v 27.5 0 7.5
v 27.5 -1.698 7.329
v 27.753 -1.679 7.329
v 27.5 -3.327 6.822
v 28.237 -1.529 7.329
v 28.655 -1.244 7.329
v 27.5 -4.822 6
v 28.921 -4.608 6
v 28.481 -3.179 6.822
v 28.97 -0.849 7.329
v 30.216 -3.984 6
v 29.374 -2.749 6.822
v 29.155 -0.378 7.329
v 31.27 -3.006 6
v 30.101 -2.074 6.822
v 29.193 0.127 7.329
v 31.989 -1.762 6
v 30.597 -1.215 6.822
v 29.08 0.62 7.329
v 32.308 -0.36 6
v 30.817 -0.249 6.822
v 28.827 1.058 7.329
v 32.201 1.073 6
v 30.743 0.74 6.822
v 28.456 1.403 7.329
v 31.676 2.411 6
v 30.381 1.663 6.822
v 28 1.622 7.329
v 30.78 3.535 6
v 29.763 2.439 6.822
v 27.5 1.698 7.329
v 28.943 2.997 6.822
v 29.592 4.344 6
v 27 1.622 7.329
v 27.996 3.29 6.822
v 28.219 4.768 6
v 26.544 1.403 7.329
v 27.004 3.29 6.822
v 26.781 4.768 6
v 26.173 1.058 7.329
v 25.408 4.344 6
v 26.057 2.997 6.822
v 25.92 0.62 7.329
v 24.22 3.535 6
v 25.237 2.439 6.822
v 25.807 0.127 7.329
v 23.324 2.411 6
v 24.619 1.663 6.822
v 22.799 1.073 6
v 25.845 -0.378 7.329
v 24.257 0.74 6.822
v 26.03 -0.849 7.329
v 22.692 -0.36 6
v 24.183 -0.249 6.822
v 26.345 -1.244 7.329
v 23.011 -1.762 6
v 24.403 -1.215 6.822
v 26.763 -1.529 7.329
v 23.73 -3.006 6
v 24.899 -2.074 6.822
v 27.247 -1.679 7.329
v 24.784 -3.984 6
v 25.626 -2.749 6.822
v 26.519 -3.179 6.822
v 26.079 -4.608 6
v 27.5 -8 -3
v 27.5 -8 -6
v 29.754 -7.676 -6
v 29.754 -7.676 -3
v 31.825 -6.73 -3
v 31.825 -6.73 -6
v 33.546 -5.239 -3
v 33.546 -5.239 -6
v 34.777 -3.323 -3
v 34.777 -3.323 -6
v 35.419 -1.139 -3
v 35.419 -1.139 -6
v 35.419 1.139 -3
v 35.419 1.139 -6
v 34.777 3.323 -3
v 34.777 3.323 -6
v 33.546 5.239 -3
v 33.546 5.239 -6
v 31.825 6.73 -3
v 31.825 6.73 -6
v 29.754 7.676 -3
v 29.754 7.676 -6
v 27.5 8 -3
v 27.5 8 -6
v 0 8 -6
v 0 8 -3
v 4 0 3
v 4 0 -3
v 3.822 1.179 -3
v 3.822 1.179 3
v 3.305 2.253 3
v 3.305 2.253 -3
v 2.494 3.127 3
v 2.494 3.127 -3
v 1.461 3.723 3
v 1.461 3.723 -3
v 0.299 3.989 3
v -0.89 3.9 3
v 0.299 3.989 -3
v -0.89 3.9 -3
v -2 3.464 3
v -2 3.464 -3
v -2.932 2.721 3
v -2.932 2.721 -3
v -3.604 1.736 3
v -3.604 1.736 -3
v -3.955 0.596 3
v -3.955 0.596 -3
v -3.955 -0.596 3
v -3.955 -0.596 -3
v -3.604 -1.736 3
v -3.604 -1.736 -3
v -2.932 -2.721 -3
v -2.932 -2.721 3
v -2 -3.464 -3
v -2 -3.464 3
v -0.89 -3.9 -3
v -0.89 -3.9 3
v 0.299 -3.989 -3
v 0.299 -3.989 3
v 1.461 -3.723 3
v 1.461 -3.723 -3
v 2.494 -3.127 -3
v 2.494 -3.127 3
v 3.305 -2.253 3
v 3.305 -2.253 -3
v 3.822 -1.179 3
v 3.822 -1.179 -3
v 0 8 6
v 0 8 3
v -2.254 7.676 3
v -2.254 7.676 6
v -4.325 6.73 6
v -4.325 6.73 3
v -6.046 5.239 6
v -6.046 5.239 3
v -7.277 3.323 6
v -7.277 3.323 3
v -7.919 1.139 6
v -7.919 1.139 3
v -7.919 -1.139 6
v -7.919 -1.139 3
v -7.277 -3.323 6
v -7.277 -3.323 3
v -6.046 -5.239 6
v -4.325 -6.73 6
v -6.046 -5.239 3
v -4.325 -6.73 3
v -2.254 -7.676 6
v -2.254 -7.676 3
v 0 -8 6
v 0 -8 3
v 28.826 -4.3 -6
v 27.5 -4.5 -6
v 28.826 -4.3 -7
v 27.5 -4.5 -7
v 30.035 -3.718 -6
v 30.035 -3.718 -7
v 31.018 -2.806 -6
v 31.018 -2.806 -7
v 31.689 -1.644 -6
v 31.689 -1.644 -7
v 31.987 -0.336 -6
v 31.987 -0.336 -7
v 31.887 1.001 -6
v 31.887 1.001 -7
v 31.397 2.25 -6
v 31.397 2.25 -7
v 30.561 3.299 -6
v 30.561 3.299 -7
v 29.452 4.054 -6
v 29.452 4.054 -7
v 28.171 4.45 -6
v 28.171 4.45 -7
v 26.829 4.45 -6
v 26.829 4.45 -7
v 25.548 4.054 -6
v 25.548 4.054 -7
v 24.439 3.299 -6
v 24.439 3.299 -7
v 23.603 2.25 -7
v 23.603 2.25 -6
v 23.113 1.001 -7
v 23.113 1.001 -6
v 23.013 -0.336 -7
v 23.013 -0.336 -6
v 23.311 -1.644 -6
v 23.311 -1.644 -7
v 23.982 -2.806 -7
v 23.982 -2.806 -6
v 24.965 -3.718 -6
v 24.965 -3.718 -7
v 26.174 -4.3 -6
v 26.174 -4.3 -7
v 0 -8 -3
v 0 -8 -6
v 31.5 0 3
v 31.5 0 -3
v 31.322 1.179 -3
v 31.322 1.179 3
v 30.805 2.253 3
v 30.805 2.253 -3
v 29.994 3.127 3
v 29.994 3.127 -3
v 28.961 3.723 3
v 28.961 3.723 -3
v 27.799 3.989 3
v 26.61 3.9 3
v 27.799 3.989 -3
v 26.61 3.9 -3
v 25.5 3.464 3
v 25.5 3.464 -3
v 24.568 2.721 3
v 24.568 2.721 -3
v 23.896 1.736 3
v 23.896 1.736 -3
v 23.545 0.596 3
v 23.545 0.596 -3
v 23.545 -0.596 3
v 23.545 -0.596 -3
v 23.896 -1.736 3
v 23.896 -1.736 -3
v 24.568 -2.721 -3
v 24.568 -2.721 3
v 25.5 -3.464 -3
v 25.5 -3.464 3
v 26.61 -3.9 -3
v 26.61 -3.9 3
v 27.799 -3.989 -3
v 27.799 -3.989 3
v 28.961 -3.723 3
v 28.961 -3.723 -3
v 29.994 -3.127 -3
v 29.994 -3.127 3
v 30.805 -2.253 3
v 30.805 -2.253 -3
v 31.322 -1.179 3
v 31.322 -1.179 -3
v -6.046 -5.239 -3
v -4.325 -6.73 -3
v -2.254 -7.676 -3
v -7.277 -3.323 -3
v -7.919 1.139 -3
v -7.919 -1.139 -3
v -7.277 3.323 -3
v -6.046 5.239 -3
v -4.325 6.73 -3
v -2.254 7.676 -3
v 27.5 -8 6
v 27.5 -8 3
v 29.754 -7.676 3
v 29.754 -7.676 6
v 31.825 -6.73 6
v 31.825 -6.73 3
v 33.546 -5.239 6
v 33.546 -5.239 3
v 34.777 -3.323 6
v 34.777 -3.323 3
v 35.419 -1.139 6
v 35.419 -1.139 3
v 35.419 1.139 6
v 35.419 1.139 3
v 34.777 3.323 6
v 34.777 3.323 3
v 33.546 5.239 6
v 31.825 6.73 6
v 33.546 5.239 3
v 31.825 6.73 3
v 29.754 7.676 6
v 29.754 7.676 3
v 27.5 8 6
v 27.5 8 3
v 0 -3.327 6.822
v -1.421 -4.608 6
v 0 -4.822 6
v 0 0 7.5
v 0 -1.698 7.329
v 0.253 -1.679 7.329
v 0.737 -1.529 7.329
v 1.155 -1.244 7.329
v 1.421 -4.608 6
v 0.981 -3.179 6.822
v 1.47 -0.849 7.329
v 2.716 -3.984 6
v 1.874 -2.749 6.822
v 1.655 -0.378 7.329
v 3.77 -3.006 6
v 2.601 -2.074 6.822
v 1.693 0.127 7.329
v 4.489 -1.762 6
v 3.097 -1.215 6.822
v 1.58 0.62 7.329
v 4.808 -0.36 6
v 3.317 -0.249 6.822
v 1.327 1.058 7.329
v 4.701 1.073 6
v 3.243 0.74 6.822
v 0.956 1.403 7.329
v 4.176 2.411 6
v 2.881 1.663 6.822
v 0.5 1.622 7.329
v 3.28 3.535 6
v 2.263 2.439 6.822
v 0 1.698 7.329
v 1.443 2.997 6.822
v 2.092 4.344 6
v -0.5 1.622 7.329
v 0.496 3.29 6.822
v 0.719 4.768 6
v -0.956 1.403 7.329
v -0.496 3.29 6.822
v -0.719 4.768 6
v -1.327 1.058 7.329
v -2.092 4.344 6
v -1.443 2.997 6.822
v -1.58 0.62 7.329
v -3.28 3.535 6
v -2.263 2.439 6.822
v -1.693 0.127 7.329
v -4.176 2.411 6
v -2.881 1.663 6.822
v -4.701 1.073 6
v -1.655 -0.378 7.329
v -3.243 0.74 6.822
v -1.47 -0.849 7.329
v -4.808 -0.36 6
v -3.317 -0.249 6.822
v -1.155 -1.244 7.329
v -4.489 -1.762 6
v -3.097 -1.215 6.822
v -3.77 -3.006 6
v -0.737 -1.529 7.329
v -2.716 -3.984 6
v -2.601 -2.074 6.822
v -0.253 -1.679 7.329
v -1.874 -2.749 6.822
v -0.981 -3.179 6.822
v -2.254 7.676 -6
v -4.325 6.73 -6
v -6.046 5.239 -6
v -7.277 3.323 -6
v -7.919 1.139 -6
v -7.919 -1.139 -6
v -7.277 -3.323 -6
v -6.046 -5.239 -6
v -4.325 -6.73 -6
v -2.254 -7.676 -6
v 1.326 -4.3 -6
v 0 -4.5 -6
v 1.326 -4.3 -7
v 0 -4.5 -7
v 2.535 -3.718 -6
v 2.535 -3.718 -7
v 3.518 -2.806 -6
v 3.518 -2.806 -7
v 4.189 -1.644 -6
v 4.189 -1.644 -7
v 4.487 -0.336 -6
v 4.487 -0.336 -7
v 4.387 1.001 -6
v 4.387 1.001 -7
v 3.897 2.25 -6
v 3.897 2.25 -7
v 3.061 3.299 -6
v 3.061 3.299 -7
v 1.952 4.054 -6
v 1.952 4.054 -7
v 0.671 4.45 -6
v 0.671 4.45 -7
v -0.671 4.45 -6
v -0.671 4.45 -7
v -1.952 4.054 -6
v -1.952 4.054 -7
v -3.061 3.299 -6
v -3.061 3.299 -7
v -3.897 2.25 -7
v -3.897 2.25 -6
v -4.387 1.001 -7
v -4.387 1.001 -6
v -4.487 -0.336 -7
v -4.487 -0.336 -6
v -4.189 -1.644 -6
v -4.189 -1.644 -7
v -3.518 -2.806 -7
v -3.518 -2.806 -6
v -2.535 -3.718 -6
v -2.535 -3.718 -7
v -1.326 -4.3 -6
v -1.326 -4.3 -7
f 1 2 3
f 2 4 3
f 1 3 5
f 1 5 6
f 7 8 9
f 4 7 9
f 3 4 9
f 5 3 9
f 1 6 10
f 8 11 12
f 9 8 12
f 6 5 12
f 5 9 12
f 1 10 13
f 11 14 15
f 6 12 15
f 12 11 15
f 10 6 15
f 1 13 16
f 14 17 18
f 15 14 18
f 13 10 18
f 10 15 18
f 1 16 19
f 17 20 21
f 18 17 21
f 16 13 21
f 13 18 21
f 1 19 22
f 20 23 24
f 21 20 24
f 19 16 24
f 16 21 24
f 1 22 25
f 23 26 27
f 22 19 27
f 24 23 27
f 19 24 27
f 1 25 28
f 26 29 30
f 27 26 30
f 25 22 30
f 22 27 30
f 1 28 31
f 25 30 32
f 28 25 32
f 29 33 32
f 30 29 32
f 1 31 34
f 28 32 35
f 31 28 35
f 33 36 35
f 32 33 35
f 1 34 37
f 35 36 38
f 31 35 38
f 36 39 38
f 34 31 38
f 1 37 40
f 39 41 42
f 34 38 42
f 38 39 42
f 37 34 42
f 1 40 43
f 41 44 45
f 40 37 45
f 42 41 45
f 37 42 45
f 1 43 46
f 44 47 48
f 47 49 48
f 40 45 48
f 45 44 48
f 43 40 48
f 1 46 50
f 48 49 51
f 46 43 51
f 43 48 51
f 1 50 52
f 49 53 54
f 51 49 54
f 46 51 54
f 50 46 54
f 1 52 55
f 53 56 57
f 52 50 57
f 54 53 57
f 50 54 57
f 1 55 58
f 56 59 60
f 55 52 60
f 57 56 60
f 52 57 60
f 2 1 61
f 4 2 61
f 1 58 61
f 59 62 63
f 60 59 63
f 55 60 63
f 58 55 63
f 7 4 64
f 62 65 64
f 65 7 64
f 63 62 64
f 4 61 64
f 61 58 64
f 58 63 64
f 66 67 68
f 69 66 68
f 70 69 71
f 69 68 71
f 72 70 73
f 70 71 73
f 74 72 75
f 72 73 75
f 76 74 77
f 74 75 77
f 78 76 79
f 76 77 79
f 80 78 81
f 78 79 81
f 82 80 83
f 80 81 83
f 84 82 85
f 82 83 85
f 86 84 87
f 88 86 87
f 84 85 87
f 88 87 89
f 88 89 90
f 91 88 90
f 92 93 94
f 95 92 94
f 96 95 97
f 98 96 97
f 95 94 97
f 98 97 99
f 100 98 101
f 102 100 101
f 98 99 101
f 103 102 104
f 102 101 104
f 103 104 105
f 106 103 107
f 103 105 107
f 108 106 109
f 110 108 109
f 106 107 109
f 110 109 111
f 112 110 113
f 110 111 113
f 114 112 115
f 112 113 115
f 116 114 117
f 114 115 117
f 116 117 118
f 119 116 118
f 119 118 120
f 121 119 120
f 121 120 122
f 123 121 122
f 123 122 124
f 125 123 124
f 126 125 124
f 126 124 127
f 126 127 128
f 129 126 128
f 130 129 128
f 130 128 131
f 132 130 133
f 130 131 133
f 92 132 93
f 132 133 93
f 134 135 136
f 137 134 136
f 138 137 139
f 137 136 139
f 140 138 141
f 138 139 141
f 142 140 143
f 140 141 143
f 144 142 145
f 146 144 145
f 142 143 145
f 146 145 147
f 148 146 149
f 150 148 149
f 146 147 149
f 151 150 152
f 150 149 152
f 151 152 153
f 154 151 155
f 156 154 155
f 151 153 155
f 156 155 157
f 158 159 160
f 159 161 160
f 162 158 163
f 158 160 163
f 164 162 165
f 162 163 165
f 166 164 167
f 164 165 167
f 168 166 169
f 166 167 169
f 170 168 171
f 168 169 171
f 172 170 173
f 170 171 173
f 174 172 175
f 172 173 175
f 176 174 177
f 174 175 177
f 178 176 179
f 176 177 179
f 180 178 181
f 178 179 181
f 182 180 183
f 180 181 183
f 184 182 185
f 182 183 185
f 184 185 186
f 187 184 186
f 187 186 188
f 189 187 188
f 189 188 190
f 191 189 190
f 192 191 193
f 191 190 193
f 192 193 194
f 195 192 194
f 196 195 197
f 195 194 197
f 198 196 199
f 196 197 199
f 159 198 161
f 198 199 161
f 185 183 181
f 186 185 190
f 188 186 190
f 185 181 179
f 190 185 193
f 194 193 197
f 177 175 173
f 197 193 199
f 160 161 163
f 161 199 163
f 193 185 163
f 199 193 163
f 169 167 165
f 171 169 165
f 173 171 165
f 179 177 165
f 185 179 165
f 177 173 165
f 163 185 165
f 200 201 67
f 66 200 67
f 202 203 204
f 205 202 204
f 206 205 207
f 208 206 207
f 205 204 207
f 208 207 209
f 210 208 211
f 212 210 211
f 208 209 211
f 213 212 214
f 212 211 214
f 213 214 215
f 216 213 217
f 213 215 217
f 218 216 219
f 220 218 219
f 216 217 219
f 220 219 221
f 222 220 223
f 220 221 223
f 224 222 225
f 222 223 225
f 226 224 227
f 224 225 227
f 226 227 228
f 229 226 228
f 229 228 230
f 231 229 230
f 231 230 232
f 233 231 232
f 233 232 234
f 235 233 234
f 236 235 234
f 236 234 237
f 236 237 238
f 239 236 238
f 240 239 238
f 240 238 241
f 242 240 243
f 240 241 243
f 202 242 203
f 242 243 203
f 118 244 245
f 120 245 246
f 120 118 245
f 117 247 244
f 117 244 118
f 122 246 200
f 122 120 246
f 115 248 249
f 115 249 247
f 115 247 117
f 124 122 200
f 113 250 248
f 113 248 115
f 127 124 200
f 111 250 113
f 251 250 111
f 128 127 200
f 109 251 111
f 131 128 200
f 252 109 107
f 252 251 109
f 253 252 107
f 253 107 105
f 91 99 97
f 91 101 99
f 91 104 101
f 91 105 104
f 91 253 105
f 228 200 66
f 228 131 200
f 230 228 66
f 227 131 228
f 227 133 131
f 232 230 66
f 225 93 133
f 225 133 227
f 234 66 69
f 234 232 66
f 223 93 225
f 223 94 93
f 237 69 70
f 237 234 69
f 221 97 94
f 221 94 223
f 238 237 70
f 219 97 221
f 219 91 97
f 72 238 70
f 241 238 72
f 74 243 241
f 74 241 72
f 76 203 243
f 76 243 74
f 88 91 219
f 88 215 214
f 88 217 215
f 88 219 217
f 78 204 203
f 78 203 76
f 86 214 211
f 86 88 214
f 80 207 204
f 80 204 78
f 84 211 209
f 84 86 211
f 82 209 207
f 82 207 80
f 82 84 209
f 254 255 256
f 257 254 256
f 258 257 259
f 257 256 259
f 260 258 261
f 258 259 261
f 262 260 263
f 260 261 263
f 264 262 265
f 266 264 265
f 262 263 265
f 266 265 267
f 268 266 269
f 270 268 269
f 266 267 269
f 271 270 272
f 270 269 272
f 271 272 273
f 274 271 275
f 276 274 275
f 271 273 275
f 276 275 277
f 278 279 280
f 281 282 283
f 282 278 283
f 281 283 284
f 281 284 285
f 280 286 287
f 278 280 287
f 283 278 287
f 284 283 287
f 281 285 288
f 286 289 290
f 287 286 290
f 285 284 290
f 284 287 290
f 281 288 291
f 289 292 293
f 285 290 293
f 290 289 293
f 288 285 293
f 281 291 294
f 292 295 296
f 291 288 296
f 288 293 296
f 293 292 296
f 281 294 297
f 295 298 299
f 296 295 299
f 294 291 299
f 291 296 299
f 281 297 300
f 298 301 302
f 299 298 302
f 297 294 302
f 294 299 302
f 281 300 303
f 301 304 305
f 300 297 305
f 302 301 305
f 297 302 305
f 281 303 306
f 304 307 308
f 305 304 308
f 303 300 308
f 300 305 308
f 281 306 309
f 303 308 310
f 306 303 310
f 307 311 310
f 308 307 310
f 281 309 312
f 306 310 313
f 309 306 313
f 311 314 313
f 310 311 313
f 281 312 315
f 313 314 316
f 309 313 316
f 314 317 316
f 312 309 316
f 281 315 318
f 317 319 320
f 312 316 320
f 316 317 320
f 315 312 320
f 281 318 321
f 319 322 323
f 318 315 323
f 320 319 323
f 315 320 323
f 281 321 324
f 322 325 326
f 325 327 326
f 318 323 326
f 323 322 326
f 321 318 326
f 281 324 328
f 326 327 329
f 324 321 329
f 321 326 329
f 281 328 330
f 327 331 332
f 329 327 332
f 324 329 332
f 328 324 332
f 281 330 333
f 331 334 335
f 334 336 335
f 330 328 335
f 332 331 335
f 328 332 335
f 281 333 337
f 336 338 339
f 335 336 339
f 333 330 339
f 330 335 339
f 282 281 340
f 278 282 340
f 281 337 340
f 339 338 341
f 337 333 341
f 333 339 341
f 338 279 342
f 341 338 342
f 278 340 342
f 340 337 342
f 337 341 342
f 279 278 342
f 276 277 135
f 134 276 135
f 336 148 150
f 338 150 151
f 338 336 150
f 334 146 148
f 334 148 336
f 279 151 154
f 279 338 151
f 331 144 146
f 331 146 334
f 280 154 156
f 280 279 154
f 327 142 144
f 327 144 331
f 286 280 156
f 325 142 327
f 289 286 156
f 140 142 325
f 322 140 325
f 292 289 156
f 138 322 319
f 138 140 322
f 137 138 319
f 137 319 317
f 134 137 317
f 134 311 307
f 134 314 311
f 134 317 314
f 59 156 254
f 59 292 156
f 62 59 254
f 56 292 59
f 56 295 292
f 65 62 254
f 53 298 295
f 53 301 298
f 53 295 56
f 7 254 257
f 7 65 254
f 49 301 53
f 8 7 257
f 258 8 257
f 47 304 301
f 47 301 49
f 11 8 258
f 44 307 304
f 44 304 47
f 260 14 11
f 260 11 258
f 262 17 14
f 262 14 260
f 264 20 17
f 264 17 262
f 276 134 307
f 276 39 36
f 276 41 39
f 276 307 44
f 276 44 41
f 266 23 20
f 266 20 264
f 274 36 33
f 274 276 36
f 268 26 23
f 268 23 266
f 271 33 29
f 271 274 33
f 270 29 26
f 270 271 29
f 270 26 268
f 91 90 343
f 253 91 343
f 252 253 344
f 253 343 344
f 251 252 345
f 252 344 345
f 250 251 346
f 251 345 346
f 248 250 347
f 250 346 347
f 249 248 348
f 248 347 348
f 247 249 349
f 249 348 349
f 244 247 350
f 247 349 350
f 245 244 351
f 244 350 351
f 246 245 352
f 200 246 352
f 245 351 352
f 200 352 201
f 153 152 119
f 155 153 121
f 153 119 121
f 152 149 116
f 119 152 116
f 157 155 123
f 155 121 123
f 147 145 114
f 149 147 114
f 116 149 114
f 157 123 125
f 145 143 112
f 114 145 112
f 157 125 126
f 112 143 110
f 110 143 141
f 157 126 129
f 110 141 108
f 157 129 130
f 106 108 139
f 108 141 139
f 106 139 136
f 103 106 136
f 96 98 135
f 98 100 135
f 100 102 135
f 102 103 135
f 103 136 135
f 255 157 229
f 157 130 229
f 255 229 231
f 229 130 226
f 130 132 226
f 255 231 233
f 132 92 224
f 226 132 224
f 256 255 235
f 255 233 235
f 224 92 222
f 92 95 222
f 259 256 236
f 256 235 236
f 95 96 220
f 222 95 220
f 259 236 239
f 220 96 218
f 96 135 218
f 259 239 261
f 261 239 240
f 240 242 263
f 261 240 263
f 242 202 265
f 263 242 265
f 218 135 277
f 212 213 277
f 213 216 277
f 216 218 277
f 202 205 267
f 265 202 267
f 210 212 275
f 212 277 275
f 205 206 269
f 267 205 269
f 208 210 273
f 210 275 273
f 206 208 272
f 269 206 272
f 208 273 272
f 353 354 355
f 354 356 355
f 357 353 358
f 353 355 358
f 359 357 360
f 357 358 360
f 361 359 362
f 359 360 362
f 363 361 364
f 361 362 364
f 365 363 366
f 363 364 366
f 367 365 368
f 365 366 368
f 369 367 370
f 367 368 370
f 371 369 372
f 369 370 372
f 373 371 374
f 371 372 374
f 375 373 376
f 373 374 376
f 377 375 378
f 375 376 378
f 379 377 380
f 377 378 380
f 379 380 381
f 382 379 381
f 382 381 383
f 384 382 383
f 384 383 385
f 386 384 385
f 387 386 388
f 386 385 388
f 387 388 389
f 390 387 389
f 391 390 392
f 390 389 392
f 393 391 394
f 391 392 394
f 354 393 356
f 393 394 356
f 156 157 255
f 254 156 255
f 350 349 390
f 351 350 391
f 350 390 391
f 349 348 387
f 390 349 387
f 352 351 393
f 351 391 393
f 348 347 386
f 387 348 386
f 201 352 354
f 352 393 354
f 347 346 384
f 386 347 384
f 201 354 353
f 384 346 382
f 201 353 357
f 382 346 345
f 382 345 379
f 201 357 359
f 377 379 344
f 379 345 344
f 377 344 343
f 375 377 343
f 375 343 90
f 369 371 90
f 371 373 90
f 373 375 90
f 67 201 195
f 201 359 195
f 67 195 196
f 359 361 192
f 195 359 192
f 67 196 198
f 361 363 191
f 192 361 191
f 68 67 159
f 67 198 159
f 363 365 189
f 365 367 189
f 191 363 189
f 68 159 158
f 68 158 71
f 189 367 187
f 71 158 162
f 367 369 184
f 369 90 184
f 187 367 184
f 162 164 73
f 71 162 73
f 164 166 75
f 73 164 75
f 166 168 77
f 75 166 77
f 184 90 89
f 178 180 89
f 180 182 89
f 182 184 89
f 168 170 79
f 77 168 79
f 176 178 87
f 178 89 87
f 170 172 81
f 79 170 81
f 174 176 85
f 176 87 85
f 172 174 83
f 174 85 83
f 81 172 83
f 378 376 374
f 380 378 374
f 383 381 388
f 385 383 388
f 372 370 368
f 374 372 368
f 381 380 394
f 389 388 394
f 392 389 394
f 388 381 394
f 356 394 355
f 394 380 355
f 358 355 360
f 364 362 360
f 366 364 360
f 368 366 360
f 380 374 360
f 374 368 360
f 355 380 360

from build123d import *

# Parameters (mm, degrees)
EXTRUDE_1_DEPTH          = 6
EXTRUDE_1_DEPTH_BACK     = 6
CUT_EXTRUDE_1_DEPTH      = 3
CUT_EXTRUDE_1_DEPTH_BACK = 3
SKETCH_4_R               = 4


with BuildPart() as part:
    # 草图1 → 凸台-拉伸1 (new, two sides: drawn at the far end of the back side and taken through both)
    with BuildSketch(Plane.XY.offset(-EXTRUDE_1_DEPTH_BACK)):
        with BuildLine():
            Line((0, -8), (27.5, -8))
            ThreePointArc((27.5, -8), (35.5, 0), (27.5, 8))
            Line((27.5, 8), (0, 8))
            ThreePointArc((0, 8), (-8, 0), (0, -8))
        make_face()
    extrude(amount=EXTRUDE_1_DEPTH + EXTRUDE_1_DEPTH_BACK)

    # 草图2 → 旋转1 (revolve)
    with BuildSketch(Plane(origin=(0, 0, 0), x_dir=(0, 0, -1), z_dir=(1, 0, 0))):
        with BuildLine():
            Line((-6, 4.82182538), (-6, 4))
            Line((-6, 4), (6, 4))
            Line((6, 4), (6, 4.5))
            Line((6, 4.5), (7, 4.5))
            Line((7, 4.5), (7, 0))
            Line((7, 0), (-7.5, 0))
            ThreePointArc((-7.5, 0), (-7.11634154, 2.524876235), (-6, 4.82182538))
        make_face()
    revolve(axis=Axis((0, 0, -7), (0, 0, 1)))

    # 草图3 → 旋转2 (revolve)
    with BuildSketch(Plane(origin=(27.5, 0, 0), x_dir=(0, 0, -1), z_dir=(1, 0, 0))):
        with BuildLine():
            Line((-6, 4.82182538), (-6, 4))
            Line((-6, 4), (6, 4))
            Line((6, 4), (6, 4.5))
            Line((6, 4.5), (7, 4.5))
            Line((7, 4.5), (7, 0))
            Line((7, 0), (-7.5, 0))
            ThreePointArc((-7.5, 0), (-7.11634154, 2.524876235), (-6, 4.82182538))
        make_face()
    revolve(axis=Axis((27.5, 0, -7), (0, 0, 1)))

    # 草图4 → 切除-拉伸1 (cut, two sides: drawn at the far end of the back side and taken through both)
    with BuildSketch(Plane.XY.offset(-CUT_EXTRUDE_1_DEPTH_BACK)):
        with BuildLine():
            Line((0, -8), (27.5, -8))
            ThreePointArc((27.5, -8), (35.5, 0), (27.5, 8))
            Line((27.5, 8), (0, 8))
            ThreePointArc((0, 8), (-8, 0), (0, -8))
        make_face()
        with Locations((27.5, 0)):
            Circle(SKETCH_4_R, mode=Mode.SUBTRACT)
        Circle(SKETCH_4_R, mode=Mode.SUBTRACT)
    extrude(amount=CUT_EXTRUDE_1_DEPTH + CUT_EXTRUDE_1_DEPTH_BACK, mode=Mode.SUBTRACT)


solid = part.part
